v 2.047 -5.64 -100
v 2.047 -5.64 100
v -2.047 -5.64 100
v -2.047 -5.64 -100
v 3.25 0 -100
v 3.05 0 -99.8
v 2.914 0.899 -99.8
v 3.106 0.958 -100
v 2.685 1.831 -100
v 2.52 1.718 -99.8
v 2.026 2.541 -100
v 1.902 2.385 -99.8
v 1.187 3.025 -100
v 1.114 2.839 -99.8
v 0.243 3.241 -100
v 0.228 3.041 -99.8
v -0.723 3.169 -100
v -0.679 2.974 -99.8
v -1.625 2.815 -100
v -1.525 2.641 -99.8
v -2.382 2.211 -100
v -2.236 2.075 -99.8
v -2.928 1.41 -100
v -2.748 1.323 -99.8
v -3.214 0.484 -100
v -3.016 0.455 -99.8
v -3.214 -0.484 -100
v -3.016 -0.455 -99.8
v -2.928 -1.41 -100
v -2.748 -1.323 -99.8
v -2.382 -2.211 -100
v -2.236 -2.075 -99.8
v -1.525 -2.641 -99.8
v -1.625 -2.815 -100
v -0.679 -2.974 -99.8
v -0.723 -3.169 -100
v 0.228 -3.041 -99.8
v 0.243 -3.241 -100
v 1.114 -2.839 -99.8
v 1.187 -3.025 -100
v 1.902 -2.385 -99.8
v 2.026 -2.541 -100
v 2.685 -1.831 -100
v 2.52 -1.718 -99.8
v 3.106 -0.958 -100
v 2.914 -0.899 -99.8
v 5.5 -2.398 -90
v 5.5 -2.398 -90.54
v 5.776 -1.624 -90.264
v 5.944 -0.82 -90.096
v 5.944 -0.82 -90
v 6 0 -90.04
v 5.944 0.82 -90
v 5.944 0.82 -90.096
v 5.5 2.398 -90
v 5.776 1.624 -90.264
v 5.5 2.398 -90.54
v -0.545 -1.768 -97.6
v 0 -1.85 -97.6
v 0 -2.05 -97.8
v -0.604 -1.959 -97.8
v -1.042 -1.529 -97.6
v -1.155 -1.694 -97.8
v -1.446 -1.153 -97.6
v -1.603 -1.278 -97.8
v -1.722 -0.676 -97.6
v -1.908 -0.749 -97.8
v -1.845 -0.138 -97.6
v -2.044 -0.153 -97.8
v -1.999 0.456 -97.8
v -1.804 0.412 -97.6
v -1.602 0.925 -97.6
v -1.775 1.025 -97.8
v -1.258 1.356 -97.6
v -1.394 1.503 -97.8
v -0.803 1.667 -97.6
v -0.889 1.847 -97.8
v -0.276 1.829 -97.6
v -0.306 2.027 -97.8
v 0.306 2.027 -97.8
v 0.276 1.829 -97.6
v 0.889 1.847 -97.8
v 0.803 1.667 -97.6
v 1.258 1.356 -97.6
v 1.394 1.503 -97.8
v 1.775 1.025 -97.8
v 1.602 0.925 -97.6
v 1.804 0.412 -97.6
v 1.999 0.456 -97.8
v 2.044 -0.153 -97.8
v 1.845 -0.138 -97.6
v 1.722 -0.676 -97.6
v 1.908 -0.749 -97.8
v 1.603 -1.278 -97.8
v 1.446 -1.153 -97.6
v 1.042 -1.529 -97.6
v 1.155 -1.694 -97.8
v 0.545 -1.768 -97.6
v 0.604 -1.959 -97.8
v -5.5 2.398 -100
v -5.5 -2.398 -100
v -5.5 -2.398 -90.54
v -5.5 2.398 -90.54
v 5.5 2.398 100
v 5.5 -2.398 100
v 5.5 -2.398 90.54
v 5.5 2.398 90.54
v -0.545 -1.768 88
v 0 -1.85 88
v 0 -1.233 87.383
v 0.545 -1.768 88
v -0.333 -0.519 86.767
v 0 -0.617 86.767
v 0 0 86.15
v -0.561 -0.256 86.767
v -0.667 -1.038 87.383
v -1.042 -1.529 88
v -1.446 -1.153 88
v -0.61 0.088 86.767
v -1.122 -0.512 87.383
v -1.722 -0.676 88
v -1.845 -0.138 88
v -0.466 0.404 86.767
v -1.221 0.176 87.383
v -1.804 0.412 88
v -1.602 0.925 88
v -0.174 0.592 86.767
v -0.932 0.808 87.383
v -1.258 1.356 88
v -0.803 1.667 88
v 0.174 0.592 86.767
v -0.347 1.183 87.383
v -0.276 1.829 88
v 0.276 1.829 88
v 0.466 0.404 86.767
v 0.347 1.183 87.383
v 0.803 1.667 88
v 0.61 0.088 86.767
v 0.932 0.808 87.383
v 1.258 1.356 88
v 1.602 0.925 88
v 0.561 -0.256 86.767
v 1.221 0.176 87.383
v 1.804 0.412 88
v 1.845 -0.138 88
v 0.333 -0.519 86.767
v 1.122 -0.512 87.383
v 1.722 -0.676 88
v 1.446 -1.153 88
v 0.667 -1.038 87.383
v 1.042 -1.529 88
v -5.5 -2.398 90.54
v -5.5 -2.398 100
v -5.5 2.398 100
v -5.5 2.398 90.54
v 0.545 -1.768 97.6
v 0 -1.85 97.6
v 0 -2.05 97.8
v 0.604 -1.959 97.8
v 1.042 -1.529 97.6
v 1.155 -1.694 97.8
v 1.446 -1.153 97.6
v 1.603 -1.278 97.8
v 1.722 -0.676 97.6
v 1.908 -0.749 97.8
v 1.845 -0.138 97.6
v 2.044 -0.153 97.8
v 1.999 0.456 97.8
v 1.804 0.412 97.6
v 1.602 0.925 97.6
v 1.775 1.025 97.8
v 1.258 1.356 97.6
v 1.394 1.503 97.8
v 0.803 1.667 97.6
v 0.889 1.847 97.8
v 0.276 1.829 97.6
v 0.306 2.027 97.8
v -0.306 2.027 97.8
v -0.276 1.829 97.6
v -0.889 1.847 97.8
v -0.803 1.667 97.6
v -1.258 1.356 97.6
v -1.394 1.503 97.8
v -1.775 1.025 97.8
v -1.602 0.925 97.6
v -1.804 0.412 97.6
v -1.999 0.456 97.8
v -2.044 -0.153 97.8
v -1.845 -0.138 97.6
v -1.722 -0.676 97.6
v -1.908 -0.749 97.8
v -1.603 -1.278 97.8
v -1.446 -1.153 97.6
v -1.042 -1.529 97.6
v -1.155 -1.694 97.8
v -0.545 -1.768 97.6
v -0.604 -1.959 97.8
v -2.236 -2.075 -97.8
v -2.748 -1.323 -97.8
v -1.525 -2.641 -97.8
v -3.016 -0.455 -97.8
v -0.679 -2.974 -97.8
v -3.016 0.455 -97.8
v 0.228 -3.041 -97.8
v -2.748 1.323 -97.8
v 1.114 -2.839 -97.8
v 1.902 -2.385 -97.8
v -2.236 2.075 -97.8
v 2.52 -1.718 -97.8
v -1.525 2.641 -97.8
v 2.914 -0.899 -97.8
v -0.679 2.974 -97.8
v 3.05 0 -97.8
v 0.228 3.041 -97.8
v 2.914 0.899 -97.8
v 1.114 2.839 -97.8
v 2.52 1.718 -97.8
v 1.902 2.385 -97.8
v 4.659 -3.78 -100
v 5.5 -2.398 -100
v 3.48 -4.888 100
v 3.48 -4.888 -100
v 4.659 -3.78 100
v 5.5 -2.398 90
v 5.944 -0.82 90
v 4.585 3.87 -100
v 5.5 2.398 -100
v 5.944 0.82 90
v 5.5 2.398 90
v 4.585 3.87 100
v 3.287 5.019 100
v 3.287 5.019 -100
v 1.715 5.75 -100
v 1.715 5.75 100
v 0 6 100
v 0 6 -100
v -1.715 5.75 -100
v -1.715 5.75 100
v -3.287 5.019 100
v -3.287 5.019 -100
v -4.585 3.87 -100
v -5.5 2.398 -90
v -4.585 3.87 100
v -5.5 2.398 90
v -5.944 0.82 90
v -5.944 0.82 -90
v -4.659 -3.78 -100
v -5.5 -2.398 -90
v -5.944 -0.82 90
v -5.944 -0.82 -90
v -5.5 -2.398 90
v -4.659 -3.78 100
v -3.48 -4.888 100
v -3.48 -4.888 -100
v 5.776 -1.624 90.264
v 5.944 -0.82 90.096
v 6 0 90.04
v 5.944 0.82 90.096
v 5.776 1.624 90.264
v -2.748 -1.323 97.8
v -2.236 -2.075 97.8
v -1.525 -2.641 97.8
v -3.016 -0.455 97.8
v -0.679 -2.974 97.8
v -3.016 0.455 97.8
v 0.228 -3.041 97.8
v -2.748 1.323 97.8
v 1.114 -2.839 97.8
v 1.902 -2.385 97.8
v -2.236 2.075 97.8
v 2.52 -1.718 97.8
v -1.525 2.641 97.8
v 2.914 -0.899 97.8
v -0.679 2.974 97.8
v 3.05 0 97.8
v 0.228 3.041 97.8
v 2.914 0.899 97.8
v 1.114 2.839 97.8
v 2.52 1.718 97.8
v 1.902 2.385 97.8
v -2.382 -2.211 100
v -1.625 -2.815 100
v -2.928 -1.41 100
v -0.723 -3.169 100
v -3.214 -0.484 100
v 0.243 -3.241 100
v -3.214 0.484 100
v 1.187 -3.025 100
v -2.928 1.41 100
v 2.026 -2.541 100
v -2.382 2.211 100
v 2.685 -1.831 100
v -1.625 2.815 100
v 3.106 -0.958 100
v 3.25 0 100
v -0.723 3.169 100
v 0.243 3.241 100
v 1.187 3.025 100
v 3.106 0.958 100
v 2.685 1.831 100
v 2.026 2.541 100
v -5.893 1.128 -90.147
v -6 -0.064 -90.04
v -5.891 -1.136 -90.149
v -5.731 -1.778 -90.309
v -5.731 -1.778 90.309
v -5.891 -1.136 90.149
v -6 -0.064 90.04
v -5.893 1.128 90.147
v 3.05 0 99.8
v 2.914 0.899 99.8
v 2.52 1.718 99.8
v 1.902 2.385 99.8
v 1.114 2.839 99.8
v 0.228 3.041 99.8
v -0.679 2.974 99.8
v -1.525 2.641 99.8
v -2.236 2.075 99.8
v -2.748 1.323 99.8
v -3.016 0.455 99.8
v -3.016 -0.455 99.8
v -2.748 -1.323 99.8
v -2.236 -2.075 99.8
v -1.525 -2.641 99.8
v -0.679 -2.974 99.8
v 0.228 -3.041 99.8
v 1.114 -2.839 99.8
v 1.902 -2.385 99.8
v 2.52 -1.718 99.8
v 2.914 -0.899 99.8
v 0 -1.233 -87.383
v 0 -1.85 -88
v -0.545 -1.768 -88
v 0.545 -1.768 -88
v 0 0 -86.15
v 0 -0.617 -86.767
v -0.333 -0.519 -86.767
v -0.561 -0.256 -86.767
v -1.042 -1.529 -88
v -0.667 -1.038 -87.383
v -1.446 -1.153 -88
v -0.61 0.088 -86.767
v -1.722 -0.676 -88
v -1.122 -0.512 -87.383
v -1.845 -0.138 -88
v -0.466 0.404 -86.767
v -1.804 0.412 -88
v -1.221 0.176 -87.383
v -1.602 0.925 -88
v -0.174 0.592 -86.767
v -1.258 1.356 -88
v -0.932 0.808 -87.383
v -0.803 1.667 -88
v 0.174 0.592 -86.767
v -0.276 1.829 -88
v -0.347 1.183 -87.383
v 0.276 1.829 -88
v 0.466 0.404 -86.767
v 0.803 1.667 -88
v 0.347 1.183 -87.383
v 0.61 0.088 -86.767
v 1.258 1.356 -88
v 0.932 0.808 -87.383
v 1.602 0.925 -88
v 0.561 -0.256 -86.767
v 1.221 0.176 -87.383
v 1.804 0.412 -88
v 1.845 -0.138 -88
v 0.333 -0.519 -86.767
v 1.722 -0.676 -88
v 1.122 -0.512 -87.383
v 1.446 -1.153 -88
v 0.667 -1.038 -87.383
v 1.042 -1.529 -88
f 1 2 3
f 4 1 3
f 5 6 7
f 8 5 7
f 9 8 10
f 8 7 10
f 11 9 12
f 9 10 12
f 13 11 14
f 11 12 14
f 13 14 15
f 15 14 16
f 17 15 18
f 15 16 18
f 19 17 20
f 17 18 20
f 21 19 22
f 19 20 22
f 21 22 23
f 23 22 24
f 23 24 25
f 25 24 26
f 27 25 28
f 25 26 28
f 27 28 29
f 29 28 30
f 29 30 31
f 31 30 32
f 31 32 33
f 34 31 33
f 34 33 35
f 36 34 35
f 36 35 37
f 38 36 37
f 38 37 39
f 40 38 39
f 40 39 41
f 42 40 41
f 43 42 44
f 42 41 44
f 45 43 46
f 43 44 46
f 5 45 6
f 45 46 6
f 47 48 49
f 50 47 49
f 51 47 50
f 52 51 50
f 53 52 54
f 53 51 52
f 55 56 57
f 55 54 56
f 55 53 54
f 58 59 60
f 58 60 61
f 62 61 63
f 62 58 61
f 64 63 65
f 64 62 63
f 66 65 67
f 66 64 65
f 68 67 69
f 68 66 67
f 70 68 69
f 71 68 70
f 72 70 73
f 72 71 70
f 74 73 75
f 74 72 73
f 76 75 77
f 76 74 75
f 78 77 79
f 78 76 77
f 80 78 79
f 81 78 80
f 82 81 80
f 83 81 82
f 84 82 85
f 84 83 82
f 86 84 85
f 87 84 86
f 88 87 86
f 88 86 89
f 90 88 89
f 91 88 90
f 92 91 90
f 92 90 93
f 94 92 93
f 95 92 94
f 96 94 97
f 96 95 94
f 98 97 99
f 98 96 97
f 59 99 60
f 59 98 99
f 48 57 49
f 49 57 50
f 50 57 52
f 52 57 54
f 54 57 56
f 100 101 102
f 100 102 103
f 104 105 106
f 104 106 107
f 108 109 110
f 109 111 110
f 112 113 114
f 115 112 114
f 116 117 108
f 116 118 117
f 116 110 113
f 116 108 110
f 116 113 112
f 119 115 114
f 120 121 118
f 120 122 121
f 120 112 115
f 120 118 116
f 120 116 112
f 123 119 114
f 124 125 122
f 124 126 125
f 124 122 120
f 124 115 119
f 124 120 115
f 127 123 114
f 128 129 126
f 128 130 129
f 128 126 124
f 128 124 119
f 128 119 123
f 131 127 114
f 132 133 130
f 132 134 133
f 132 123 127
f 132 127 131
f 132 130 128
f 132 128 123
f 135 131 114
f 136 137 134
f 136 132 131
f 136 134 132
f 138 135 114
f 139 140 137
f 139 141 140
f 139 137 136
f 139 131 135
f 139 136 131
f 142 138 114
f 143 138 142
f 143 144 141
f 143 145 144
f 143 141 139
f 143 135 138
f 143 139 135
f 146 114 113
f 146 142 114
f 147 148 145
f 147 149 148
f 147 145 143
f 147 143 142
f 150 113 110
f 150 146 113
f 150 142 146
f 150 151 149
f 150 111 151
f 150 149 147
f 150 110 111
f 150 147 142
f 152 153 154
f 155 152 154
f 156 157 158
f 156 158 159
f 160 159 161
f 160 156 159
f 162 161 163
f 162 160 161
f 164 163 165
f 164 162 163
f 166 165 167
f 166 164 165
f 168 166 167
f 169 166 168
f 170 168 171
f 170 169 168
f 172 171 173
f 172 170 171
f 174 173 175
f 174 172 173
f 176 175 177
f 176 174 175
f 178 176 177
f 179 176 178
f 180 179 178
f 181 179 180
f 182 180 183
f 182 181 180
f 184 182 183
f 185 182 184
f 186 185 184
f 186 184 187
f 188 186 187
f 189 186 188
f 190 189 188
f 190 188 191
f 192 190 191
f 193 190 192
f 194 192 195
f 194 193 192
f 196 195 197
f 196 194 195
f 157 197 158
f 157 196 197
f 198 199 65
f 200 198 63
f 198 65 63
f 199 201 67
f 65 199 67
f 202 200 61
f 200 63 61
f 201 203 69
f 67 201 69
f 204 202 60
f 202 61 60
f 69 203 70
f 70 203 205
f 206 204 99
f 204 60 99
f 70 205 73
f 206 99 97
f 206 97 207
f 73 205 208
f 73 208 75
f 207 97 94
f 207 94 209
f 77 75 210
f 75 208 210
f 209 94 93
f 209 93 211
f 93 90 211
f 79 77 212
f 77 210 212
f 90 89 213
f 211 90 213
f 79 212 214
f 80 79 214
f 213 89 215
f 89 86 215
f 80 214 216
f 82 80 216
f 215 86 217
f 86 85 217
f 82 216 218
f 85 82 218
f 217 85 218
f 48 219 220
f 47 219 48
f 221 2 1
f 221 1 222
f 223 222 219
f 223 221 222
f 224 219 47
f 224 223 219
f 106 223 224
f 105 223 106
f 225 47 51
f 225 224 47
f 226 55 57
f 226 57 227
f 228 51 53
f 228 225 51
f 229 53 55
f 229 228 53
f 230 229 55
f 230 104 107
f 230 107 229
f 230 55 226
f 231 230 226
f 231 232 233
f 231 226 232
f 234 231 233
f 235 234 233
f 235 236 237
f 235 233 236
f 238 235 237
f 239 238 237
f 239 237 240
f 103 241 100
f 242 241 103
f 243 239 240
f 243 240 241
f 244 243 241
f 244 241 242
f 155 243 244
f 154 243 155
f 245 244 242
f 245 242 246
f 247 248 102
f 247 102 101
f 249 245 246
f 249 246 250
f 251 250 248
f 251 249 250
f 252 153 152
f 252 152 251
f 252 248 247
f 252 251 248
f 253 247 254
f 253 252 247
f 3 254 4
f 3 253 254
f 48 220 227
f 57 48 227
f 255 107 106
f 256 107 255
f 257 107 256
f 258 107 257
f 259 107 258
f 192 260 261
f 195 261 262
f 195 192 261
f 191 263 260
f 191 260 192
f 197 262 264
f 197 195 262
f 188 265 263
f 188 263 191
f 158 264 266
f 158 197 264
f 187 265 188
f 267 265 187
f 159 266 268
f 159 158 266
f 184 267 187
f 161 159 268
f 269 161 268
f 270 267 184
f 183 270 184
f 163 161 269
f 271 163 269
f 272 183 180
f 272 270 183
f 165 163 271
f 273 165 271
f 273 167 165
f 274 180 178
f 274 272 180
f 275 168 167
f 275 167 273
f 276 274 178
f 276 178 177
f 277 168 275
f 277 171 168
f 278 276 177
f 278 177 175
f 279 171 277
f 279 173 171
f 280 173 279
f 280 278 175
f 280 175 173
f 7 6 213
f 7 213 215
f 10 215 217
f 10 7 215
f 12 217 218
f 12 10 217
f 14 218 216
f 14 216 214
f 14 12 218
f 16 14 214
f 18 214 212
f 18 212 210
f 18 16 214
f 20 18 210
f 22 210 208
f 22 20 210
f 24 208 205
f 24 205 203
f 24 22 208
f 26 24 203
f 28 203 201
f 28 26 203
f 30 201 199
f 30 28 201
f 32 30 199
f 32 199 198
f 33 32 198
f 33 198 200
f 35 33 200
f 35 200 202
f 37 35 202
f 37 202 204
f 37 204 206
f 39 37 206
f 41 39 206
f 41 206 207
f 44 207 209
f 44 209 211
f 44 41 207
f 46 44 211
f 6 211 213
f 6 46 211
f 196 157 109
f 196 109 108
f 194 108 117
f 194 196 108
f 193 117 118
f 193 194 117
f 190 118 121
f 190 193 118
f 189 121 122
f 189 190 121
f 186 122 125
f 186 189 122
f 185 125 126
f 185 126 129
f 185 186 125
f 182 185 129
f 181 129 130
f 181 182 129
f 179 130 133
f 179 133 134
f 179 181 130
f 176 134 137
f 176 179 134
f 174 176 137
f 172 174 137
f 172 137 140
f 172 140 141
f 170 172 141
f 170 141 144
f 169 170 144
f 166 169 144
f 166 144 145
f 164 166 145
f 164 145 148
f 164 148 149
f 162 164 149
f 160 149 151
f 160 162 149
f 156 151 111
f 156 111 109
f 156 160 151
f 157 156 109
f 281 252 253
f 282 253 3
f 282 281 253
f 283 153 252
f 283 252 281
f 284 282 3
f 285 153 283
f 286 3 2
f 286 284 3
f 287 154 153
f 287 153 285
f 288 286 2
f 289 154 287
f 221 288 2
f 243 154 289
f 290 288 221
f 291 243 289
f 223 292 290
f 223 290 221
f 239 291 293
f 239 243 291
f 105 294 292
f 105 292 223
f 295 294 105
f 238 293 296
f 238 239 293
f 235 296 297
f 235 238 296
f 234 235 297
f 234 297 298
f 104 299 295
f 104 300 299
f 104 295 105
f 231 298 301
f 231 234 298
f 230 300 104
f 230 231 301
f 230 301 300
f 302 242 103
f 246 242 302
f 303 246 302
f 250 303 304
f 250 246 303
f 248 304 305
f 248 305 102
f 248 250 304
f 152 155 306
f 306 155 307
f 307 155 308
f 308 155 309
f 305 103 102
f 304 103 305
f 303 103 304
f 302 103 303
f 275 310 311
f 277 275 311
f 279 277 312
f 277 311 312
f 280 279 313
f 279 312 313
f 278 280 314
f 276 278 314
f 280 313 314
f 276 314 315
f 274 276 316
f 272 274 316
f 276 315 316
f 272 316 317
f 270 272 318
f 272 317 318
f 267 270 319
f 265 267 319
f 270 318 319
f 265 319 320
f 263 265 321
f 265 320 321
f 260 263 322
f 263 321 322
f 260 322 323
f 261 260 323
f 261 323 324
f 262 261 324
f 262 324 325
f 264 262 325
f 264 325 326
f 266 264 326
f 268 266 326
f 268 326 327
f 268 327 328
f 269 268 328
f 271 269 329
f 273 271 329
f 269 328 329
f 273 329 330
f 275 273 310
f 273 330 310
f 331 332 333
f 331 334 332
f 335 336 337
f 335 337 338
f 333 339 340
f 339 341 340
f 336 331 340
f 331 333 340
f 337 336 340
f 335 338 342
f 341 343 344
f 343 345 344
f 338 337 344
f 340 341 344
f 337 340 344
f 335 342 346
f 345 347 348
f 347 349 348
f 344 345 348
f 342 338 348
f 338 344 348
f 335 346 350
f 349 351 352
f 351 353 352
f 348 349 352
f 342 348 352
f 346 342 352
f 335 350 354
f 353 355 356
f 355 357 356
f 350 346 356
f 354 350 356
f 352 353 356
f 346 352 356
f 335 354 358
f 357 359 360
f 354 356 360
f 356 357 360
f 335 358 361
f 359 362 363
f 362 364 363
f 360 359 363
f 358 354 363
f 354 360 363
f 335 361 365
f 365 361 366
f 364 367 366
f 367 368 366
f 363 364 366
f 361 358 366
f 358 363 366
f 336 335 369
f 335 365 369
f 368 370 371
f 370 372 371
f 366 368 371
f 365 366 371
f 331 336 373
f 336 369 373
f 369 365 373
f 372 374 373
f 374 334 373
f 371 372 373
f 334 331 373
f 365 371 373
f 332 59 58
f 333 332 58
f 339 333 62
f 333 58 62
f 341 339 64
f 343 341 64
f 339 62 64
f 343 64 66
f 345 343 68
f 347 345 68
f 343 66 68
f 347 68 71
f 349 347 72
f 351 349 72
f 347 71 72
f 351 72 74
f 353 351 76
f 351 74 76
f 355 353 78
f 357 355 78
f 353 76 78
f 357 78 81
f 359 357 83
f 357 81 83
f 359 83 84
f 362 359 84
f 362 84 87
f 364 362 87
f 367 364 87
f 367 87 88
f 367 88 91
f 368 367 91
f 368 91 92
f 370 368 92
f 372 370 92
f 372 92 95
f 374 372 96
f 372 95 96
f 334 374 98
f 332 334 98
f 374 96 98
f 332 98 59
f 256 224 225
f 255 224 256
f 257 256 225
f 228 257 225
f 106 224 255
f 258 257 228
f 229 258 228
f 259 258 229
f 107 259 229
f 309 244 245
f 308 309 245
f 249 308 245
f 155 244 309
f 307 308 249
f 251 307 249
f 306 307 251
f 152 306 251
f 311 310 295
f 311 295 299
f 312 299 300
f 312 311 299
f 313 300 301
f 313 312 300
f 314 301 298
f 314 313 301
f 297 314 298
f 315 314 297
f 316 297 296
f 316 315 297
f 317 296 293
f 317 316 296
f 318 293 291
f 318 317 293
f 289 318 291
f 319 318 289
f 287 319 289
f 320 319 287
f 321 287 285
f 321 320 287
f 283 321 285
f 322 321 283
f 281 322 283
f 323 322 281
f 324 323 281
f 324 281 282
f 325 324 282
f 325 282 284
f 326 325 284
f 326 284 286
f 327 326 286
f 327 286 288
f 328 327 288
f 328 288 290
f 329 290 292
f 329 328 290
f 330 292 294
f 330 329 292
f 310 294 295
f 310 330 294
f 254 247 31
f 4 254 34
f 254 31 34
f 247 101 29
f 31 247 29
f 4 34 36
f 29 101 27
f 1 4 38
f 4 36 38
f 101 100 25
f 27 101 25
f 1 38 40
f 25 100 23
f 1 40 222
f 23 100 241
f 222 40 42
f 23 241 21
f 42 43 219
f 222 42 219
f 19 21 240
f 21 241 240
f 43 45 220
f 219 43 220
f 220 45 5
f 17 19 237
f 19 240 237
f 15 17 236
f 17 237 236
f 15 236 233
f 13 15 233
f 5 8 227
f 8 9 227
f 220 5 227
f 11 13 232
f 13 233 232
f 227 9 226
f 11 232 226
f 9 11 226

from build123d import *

# Parameters (mm, degrees)
SKETCH1_R                = 6
BOSS_EXTRUDE1_DEPTH      = 100
SKETCH5_R                = 3.05
CUT_EXTRUDE1_DEPTH       = 2.2
CHAMFER1_SIZE            = 0.2
CUT_EXTRUDE2_DEPTH       = 201.179919073
CUT_EXTRUDE4_DEPTH       = 10
CHAMFER3_SIZE            = 0.54
CHAMFER3_OF_MIRROR3_SIZE = 0.54


with BuildPart() as part:
    # Sketch1 → Boss-Extrude1 (new, symmetric)
    with BuildSketch(Plane.XY):
        Circle(SKETCH1_R)
    extrude(amount=BOSS_EXTRUDE1_DEPTH, both=True)

    # Sketch4 → Hole1 (revolve, cut)
    with BuildSketch(Plane(origin=(0, 0, 100), x_dir=(0, -1, 0), z_dir=(1, 0, 0))):
        Polygon((0, 0), (0, 13.85), (1.85, 12), (1.85, 0), align=None)
    hole1 = revolve(axis=Axis((0, 0, 104.244199587), (0, 0, -1)), mode=Mode.SUBTRACT)

    # Sketch5 → Cut-Extrude1 (cut)
    with BuildSketch(Plane.XY.offset(100)):
        Circle(SKETCH5_R)
    cut_extrude1 = extrude(amount=-CUT_EXTRUDE1_DEPTH, mode=Mode.SUBTRACT)

    # Mirror2: Hole1, Cut-Extrude1 across plane
    add(hole1.mirror(Plane.XY), mode=Mode.SUBTRACT)
    add(cut_extrude1.mirror(Plane.XY), mode=Mode.SUBTRACT)

    # Chamfer1
    chamfer1_edges = [part.edges().sort_by_distance(p)[0] for p in [
        (-3.05, 0, 100),
        (0, 1.85, 97.8),
        (-3.05, 0, -100),
        (0, 1.85, -97.8),
    ]]
    chamfer(chamfer1_edges, length=CHAMFER1_SIZE)

    # Sketch6 → Cut-Extrude2 (cut, through all)
    with BuildSketch(Plane.XY.offset(100)):
        with BuildLine():
            Line((2.047046653, -5.64), (-2.047046653, -5.64))
            ThreePointArc((-2.047046653, -5.64), (0, -6), (2.047046653, -5.64))
        make_face()
    extrude(amount=-CUT_EXTRUDE2_DEPTH, mode=Mode.SUBTRACT)

    # Sketch9 → Cut-Extrude4 (cut)
    with BuildSketch(Plane.XY.offset(100)):
        with BuildLine():
            Line((-5.5, -2.397915762), (-5.5, 2.397915762))
            ThreePointArc((-5.5, 2.397915762), (-6, 0), (-5.5, -2.397915762))
        make_face()
        with BuildLine():
            Line((5.5, -2.397915762), (5.5, 2.397915762))
            ThreePointArc((5.5, 2.397915762), (6, 0), (5.5, -2.397915762))
        make_face()
    cut_extrude4 = extrude(amount=-CUT_EXTRUDE4_DEPTH, mode=Mode.SUBTRACT)

    # Chamfer3
    # the kernel refuses this chamfer: 0.54 mm, written as the material it adds along each edge
    with BuildSketch(Plane(origin=(5.5, -3.786624575, 90), x_dir=(-0.027495876610584932, 0, 0.9996219169112968), z_dir=(0, 1, 0))) as chamfer3_piece_1_section:
        Polygon((CHAMFER3_SIZE * 0.999621916911, CHAMFER3_SIZE * 0.0274958766106), (-CHAMFER3_SIZE * 0.0274958766106, CHAMFER3_SIZE * 0.999621916911), (0, 0), align=None)
    chamfer3_piece_1 = extrude(amount=7.57324915, mode=Mode.PRIVATE)
    chamfer3_piece_1 = chamfer3_piece_1 & Plane(origin=(0, 0, 90.196712304), x_dir=(1, 0, 0), z_dir=(0, 0, 1)) * Cylinder(6, 18, mode=Mode.PRIVATE)
    add(chamfer3_piece_1)
    with BuildSketch(Plane(origin=(-5.5, -3.786624575, 90), x_dir=(0.027495876610584932, 0, 0.9996219169112968), z_dir=(0, 1, 0))) as chamfer3_piece_2_section:
        Polygon((CHAMFER3_SIZE * 0.999621916911, -CHAMFER3_SIZE * 0.0274958766106), (-CHAMFER3_SIZE * 0.0274958766106, -CHAMFER3_SIZE * 0.999621916911), (0, 0), align=None)
    chamfer3_piece_2 = extrude(amount=7.57324915, mode=Mode.PRIVATE)
    chamfer3_piece_2 = chamfer3_piece_2 & Plane(origin=(0, 0, 90.196712302), x_dir=(1, 0, 0), z_dir=(0, 0, 1)) * Cylinder(6, 18, mode=Mode.PRIVATE)
    add(chamfer3_piece_2)

    # Mirror3: Cut-Extrude4 across plane
    add(cut_extrude4.mirror(Plane.XY), mode=Mode.SUBTRACT)

    # Chamfer3 of Mirror3
    # the kernel refuses this chamfer: 0.54 mm, written as the material it adds along each edge
    with BuildSketch(Plane(origin=(5.5, -3.786624575, -90), x_dir=(-0.027495876610584932, 0, -0.9996219169112968), z_dir=(0, 1, 0))) as chamfer3_of_mirror3_piece_1_section:
        Polygon((CHAMFER3_OF_MIRROR3_SIZE * 0.999621916911, -CHAMFER3_OF_MIRROR3_SIZE * 0.0274958766106), (-CHAMFER3_OF_MIRROR3_SIZE * 0.0274958766106, -CHAMFER3_OF_MIRROR3_SIZE * 0.999621916911), (0, 0), align=None)
    chamfer3_of_mirror3_piece_1 = extrude(amount=7.57324915, mode=Mode.PRIVATE)
    chamfer3_of_mirror3_piece_1 = chamfer3_of_mirror3_piece_1 & Plane(origin=(0, 0, -90.196712304), x_dir=(1, 0, 0), z_dir=(0, 0, 1)) * Cylinder(6, 18, mode=Mode.PRIVATE)
    add(chamfer3_of_mirror3_piece_1)
    with BuildSketch(Plane(origin=(-5.5, -3.786624575, -90), x_dir=(0.027495876610584932, 0, -0.9996219169112968), z_dir=(0, 1, 0))) as chamfer3_of_mirror3_piece_2_section:
        Polygon((CHAMFER3_OF_MIRROR3_SIZE * 0.999621916911, CHAMFER3_OF_MIRROR3_SIZE * 0.0274958766106), (-CHAMFER3_OF_MIRROR3_SIZE * 0.0274958766106, CHAMFER3_OF_MIRROR3_SIZE * 0.999621916911), (0, 0), align=None)
    chamfer3_of_mirror3_piece_2 = extrude(amount=7.57324915, mode=Mode.PRIVATE)
    chamfer3_of_mirror3_piece_2 = chamfer3_of_mirror3_piece_2 & Plane(origin=(0, 0, -90.196712302), x_dir=(1, 0, 0), z_dir=(0, 0, 1)) * Cylinder(6, 18, mode=Mode.PRIVATE)
    add(chamfer3_of_mirror3_piece_2)


solid = part.part
